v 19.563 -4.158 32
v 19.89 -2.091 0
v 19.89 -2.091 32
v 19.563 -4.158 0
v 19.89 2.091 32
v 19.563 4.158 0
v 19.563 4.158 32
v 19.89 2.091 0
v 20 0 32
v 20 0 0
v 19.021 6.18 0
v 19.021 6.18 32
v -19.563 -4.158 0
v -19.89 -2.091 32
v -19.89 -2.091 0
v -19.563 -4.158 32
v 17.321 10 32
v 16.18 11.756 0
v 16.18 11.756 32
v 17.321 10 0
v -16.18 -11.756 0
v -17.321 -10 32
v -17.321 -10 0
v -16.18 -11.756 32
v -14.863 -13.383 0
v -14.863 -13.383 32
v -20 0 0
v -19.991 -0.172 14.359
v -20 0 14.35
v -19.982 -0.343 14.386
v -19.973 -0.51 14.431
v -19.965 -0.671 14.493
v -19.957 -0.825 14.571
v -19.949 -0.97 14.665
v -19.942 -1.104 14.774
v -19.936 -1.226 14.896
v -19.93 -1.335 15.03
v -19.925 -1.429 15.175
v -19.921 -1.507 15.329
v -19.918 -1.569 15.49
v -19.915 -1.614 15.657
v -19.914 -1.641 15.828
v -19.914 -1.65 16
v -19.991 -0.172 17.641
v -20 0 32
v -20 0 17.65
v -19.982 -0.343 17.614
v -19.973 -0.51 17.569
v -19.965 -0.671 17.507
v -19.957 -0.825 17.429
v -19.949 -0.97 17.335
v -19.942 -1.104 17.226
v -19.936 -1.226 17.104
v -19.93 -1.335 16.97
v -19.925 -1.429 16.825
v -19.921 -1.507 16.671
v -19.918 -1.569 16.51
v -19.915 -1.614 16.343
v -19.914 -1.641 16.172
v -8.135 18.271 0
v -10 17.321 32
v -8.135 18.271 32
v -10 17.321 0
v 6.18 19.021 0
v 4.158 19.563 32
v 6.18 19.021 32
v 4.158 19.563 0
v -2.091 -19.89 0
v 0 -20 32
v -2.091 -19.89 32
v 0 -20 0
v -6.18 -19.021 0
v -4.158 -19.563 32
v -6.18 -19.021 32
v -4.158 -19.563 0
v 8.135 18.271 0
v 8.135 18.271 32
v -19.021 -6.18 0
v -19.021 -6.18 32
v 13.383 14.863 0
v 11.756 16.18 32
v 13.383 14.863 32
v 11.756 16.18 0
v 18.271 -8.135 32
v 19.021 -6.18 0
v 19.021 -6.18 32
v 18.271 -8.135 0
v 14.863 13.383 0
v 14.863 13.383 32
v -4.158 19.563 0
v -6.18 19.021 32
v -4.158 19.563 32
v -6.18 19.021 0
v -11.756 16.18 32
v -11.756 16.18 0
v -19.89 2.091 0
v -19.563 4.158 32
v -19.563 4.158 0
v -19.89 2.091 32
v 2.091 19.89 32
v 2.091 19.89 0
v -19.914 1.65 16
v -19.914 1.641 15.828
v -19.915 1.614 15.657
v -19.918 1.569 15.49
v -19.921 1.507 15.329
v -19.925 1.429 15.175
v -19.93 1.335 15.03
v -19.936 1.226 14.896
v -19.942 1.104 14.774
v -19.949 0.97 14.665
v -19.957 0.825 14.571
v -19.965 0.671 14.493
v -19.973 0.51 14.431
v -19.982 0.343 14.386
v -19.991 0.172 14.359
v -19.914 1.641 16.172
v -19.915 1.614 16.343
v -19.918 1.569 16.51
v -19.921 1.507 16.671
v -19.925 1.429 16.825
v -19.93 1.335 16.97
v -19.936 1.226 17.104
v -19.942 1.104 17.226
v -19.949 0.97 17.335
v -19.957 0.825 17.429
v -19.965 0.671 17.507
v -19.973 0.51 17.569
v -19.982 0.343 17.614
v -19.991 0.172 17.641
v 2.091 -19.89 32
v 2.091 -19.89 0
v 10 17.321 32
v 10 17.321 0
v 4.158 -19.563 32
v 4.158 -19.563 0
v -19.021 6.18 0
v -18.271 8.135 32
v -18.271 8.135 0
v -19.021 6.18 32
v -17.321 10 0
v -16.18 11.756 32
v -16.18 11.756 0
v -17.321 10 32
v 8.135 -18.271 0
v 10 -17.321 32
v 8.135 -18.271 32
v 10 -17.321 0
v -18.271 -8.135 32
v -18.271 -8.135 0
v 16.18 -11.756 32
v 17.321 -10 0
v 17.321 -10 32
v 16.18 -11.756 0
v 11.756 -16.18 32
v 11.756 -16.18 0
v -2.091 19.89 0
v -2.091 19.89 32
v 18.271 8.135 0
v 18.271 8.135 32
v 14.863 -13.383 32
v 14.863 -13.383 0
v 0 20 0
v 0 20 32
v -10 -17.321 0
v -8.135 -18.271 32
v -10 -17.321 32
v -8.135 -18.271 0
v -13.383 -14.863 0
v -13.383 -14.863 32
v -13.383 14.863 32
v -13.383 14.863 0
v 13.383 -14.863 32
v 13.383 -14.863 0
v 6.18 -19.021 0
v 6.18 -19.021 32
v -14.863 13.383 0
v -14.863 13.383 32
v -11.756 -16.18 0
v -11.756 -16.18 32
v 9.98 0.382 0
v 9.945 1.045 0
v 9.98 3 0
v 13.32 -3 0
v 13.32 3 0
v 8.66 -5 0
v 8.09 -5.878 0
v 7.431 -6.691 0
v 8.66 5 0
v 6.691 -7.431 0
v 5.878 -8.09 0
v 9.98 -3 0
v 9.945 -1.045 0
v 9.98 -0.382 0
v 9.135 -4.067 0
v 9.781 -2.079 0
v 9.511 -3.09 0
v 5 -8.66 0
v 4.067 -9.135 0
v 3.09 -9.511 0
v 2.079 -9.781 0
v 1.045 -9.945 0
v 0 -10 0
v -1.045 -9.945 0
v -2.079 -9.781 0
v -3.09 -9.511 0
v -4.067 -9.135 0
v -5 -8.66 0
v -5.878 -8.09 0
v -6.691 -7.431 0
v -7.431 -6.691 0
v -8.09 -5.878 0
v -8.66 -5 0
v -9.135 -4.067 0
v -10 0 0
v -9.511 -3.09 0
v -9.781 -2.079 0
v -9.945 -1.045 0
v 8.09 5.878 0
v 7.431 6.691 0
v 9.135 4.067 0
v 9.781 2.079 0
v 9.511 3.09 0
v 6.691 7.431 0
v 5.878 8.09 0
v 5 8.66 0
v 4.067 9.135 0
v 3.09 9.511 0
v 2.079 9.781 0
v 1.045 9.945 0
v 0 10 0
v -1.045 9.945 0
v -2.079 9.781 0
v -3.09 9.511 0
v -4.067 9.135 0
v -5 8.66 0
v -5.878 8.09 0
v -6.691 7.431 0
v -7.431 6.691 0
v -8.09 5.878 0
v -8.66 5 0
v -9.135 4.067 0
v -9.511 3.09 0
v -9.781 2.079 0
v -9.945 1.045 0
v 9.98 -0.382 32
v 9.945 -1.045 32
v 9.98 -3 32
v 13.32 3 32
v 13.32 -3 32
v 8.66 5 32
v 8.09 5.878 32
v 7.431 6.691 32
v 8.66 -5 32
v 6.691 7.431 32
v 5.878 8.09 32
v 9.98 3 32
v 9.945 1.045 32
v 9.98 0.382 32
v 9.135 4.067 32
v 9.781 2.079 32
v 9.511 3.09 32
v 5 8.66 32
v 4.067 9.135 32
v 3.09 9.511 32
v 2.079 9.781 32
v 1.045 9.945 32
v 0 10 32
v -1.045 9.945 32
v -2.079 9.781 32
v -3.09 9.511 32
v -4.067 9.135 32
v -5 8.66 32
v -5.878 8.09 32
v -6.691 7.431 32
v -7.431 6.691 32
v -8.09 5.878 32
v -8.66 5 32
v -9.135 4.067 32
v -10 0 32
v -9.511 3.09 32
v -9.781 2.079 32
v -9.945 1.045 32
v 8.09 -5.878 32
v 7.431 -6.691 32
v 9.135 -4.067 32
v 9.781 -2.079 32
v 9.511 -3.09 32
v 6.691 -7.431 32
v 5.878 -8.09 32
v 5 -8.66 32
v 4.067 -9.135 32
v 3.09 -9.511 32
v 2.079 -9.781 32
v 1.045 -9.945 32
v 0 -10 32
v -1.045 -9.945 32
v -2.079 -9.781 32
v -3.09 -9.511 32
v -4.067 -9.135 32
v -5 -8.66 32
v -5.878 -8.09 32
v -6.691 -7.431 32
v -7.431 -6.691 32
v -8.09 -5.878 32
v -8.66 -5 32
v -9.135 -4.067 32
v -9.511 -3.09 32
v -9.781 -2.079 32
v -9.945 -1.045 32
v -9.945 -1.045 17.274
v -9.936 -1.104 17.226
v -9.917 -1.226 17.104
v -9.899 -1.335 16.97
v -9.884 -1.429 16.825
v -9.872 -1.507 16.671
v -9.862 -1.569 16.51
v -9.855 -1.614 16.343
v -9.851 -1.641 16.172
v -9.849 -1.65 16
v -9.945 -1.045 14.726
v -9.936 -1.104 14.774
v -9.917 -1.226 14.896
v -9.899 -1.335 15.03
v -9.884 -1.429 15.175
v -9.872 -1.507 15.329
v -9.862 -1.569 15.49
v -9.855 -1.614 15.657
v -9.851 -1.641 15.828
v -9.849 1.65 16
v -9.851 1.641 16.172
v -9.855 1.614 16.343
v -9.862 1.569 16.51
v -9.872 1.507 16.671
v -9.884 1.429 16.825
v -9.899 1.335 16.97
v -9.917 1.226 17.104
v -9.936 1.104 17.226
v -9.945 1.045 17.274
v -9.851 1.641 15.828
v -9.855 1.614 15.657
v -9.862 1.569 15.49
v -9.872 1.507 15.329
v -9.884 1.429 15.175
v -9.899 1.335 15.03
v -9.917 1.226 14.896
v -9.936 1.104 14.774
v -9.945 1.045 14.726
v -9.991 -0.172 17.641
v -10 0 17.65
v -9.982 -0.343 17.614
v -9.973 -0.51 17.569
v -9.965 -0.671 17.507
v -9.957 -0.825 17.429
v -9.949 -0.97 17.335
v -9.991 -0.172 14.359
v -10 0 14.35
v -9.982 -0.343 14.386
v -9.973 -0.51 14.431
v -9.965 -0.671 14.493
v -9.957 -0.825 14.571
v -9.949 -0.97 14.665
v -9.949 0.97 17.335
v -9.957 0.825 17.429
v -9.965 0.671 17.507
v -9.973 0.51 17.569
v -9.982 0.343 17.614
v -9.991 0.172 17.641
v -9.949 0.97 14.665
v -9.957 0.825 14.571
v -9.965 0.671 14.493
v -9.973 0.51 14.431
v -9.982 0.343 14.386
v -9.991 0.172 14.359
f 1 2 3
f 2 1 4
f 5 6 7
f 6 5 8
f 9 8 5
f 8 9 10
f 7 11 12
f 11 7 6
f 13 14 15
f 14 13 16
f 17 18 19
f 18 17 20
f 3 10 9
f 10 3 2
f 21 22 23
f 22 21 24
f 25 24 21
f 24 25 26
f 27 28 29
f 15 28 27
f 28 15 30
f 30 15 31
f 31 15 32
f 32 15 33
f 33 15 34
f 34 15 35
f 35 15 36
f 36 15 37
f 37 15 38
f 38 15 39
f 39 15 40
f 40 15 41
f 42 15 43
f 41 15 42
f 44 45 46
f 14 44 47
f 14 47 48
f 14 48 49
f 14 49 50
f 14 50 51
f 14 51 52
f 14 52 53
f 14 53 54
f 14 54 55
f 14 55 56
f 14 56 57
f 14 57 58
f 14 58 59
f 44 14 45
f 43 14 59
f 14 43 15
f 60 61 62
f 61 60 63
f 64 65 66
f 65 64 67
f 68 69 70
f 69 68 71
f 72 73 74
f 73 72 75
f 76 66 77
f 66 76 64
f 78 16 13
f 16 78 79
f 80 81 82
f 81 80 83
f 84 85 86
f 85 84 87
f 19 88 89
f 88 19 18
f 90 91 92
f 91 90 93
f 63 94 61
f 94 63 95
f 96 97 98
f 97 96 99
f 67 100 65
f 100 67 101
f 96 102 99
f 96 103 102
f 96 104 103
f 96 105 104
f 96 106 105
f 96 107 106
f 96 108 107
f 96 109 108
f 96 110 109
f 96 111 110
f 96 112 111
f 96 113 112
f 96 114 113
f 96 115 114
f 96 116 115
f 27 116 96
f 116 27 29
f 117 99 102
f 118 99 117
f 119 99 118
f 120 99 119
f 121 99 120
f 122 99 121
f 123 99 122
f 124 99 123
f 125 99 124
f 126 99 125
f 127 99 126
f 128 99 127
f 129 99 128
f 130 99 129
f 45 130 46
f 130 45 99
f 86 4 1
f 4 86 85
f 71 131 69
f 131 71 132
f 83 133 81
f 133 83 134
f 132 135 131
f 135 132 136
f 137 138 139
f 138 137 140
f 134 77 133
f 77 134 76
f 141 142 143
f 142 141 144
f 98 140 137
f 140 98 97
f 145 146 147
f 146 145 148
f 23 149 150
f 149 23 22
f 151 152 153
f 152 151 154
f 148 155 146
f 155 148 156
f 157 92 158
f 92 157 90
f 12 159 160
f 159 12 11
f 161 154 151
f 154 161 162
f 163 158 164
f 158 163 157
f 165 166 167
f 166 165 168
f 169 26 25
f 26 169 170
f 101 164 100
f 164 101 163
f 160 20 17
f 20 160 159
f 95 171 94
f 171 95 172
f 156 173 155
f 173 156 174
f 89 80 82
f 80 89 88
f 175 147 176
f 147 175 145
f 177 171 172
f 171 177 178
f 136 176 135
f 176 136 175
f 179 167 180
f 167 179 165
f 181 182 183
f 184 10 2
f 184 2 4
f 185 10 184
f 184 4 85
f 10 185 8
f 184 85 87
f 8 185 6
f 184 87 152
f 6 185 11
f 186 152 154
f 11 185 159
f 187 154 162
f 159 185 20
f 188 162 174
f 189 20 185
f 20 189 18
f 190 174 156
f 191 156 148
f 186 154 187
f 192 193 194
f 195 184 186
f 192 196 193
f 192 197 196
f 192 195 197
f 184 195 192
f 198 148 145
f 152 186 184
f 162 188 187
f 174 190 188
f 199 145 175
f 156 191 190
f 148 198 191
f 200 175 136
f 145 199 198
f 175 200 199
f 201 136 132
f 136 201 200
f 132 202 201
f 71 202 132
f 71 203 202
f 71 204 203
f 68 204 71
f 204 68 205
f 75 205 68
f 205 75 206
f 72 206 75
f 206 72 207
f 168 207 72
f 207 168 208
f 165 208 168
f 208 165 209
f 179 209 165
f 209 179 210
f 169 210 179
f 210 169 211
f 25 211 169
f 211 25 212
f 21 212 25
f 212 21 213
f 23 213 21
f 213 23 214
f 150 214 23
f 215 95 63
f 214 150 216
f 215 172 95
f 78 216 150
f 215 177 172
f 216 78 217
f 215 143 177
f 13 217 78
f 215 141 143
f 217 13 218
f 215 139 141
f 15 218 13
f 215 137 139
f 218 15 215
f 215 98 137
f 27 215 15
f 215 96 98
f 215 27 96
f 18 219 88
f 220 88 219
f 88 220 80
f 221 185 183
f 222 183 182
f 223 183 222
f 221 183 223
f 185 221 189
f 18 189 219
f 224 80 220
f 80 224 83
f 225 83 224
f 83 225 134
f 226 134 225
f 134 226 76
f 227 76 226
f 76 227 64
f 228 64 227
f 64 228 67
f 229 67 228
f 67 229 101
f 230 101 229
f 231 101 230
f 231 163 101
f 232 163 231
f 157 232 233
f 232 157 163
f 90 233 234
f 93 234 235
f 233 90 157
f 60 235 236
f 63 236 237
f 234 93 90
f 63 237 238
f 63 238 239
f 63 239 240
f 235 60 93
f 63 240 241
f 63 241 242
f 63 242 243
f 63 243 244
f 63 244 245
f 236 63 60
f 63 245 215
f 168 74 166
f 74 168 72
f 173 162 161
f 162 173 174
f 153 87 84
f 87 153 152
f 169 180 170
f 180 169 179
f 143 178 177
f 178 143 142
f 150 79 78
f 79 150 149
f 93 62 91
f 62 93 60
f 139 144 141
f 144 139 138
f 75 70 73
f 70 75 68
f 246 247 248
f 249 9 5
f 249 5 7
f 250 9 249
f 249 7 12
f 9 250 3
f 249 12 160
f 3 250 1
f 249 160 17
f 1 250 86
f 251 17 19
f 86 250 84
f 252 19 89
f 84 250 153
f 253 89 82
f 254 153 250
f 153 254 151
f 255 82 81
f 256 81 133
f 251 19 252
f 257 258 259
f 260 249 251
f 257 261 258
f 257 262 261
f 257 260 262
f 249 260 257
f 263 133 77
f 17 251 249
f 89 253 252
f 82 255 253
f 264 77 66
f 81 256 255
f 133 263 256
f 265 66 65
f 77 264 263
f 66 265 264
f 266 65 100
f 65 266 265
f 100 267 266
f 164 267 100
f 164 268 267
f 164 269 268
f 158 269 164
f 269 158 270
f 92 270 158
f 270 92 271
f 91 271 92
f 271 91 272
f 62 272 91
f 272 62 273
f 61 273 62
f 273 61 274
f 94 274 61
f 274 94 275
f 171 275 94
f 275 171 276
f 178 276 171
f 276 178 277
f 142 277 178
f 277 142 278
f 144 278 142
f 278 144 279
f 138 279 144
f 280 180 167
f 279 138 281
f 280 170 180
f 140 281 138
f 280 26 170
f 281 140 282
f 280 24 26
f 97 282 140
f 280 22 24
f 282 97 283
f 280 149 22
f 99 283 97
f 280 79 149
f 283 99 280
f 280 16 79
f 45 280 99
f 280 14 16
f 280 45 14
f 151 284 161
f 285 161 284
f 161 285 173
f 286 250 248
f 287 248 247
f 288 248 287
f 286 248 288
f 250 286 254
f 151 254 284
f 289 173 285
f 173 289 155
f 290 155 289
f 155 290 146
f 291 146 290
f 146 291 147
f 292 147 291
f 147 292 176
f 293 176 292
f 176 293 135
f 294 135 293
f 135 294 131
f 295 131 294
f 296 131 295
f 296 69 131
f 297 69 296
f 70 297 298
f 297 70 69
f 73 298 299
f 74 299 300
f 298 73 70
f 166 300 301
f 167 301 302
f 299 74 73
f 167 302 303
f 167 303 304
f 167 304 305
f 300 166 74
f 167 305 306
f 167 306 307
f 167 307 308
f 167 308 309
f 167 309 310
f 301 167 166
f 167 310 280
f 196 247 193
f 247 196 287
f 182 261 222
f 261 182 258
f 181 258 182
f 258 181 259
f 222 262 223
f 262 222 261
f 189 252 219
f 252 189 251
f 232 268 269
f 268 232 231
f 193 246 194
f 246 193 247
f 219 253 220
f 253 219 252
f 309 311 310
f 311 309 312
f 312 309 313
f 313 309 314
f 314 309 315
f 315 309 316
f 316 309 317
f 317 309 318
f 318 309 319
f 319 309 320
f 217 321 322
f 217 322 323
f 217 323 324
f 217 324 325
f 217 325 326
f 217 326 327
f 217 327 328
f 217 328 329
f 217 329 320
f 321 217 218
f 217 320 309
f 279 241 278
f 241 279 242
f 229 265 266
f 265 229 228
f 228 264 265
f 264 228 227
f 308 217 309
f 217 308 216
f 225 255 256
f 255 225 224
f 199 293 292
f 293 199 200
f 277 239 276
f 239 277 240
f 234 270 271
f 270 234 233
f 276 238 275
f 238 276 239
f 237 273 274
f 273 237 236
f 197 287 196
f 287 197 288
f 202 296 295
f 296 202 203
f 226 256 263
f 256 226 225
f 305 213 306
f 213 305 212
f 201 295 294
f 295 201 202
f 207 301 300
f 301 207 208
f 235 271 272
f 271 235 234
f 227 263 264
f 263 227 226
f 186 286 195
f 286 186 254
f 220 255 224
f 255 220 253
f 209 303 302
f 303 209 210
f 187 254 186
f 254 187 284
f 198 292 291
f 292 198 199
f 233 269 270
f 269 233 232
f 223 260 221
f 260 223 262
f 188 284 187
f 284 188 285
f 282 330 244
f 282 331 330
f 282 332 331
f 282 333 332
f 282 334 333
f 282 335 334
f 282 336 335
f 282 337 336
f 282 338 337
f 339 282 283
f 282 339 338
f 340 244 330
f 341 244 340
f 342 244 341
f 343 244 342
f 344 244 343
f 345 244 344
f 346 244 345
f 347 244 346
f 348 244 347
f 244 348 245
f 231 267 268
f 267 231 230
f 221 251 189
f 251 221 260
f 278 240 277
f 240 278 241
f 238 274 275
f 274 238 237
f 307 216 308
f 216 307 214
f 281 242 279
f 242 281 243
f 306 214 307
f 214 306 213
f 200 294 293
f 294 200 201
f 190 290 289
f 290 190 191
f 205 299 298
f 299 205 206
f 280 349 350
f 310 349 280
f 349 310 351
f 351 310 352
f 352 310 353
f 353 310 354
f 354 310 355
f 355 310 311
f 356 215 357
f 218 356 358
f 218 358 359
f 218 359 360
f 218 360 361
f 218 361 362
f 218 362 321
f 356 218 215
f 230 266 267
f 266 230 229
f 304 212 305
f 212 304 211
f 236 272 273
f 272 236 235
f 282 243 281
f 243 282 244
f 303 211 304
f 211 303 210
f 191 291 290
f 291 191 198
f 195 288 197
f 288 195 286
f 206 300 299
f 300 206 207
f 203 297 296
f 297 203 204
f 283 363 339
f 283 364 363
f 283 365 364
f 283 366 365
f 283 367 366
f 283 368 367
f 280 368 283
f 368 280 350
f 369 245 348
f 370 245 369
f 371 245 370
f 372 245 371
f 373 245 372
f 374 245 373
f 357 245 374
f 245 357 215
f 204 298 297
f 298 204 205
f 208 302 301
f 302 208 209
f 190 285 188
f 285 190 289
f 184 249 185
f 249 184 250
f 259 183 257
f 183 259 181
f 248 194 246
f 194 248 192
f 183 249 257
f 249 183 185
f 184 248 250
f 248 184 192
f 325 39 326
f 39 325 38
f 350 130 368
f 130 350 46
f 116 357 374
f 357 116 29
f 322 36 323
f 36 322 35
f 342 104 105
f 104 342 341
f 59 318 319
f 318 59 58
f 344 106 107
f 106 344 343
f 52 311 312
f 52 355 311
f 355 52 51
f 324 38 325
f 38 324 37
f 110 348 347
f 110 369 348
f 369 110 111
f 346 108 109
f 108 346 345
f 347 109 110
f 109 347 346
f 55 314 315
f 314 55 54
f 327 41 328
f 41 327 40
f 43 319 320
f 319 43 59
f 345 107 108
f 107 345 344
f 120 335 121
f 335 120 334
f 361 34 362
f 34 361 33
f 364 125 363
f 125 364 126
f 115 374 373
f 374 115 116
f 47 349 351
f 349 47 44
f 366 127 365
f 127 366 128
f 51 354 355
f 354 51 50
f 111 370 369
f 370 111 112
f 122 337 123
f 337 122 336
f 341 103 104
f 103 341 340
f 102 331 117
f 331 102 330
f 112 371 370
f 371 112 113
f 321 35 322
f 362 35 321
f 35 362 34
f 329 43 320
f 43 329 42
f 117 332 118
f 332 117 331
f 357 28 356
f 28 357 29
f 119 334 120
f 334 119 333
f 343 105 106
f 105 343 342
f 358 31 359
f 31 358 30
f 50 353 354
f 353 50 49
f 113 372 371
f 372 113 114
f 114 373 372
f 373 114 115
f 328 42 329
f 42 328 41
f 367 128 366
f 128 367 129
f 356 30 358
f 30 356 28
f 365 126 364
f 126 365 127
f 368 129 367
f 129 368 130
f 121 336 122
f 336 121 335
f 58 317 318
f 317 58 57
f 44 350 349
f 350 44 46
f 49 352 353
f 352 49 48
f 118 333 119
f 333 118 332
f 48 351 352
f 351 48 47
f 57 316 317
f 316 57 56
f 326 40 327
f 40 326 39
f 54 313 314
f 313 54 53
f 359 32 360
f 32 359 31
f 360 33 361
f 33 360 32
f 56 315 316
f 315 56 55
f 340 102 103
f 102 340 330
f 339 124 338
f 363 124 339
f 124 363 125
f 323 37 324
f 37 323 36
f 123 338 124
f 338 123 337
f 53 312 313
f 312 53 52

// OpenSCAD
// Keyway hub for a 20 mm shaft.
$fn = 60;
eps = 0.02;
shaft_d = 20;
outer_d = 40;
length = 32;
key_w = 6;
key_depth = 3.3000000000000003;
difference() {
    cylinder(d = outer_d, h = length);
    translate([0, 0, -eps]) cylinder(d = shaft_d, h = length + 2 * eps);
    translate([shaft_d / 2 - eps, -key_w / 2, -eps]) cube([key_depth + 2 * eps, key_w, length + 2 * eps]);
    translate([-outer_d / 2 - eps, 0, length / 2]) rotate([0, 90, 0]) cylinder(d = 3.3, h = outer_d / 2 + 2 * eps);
}
